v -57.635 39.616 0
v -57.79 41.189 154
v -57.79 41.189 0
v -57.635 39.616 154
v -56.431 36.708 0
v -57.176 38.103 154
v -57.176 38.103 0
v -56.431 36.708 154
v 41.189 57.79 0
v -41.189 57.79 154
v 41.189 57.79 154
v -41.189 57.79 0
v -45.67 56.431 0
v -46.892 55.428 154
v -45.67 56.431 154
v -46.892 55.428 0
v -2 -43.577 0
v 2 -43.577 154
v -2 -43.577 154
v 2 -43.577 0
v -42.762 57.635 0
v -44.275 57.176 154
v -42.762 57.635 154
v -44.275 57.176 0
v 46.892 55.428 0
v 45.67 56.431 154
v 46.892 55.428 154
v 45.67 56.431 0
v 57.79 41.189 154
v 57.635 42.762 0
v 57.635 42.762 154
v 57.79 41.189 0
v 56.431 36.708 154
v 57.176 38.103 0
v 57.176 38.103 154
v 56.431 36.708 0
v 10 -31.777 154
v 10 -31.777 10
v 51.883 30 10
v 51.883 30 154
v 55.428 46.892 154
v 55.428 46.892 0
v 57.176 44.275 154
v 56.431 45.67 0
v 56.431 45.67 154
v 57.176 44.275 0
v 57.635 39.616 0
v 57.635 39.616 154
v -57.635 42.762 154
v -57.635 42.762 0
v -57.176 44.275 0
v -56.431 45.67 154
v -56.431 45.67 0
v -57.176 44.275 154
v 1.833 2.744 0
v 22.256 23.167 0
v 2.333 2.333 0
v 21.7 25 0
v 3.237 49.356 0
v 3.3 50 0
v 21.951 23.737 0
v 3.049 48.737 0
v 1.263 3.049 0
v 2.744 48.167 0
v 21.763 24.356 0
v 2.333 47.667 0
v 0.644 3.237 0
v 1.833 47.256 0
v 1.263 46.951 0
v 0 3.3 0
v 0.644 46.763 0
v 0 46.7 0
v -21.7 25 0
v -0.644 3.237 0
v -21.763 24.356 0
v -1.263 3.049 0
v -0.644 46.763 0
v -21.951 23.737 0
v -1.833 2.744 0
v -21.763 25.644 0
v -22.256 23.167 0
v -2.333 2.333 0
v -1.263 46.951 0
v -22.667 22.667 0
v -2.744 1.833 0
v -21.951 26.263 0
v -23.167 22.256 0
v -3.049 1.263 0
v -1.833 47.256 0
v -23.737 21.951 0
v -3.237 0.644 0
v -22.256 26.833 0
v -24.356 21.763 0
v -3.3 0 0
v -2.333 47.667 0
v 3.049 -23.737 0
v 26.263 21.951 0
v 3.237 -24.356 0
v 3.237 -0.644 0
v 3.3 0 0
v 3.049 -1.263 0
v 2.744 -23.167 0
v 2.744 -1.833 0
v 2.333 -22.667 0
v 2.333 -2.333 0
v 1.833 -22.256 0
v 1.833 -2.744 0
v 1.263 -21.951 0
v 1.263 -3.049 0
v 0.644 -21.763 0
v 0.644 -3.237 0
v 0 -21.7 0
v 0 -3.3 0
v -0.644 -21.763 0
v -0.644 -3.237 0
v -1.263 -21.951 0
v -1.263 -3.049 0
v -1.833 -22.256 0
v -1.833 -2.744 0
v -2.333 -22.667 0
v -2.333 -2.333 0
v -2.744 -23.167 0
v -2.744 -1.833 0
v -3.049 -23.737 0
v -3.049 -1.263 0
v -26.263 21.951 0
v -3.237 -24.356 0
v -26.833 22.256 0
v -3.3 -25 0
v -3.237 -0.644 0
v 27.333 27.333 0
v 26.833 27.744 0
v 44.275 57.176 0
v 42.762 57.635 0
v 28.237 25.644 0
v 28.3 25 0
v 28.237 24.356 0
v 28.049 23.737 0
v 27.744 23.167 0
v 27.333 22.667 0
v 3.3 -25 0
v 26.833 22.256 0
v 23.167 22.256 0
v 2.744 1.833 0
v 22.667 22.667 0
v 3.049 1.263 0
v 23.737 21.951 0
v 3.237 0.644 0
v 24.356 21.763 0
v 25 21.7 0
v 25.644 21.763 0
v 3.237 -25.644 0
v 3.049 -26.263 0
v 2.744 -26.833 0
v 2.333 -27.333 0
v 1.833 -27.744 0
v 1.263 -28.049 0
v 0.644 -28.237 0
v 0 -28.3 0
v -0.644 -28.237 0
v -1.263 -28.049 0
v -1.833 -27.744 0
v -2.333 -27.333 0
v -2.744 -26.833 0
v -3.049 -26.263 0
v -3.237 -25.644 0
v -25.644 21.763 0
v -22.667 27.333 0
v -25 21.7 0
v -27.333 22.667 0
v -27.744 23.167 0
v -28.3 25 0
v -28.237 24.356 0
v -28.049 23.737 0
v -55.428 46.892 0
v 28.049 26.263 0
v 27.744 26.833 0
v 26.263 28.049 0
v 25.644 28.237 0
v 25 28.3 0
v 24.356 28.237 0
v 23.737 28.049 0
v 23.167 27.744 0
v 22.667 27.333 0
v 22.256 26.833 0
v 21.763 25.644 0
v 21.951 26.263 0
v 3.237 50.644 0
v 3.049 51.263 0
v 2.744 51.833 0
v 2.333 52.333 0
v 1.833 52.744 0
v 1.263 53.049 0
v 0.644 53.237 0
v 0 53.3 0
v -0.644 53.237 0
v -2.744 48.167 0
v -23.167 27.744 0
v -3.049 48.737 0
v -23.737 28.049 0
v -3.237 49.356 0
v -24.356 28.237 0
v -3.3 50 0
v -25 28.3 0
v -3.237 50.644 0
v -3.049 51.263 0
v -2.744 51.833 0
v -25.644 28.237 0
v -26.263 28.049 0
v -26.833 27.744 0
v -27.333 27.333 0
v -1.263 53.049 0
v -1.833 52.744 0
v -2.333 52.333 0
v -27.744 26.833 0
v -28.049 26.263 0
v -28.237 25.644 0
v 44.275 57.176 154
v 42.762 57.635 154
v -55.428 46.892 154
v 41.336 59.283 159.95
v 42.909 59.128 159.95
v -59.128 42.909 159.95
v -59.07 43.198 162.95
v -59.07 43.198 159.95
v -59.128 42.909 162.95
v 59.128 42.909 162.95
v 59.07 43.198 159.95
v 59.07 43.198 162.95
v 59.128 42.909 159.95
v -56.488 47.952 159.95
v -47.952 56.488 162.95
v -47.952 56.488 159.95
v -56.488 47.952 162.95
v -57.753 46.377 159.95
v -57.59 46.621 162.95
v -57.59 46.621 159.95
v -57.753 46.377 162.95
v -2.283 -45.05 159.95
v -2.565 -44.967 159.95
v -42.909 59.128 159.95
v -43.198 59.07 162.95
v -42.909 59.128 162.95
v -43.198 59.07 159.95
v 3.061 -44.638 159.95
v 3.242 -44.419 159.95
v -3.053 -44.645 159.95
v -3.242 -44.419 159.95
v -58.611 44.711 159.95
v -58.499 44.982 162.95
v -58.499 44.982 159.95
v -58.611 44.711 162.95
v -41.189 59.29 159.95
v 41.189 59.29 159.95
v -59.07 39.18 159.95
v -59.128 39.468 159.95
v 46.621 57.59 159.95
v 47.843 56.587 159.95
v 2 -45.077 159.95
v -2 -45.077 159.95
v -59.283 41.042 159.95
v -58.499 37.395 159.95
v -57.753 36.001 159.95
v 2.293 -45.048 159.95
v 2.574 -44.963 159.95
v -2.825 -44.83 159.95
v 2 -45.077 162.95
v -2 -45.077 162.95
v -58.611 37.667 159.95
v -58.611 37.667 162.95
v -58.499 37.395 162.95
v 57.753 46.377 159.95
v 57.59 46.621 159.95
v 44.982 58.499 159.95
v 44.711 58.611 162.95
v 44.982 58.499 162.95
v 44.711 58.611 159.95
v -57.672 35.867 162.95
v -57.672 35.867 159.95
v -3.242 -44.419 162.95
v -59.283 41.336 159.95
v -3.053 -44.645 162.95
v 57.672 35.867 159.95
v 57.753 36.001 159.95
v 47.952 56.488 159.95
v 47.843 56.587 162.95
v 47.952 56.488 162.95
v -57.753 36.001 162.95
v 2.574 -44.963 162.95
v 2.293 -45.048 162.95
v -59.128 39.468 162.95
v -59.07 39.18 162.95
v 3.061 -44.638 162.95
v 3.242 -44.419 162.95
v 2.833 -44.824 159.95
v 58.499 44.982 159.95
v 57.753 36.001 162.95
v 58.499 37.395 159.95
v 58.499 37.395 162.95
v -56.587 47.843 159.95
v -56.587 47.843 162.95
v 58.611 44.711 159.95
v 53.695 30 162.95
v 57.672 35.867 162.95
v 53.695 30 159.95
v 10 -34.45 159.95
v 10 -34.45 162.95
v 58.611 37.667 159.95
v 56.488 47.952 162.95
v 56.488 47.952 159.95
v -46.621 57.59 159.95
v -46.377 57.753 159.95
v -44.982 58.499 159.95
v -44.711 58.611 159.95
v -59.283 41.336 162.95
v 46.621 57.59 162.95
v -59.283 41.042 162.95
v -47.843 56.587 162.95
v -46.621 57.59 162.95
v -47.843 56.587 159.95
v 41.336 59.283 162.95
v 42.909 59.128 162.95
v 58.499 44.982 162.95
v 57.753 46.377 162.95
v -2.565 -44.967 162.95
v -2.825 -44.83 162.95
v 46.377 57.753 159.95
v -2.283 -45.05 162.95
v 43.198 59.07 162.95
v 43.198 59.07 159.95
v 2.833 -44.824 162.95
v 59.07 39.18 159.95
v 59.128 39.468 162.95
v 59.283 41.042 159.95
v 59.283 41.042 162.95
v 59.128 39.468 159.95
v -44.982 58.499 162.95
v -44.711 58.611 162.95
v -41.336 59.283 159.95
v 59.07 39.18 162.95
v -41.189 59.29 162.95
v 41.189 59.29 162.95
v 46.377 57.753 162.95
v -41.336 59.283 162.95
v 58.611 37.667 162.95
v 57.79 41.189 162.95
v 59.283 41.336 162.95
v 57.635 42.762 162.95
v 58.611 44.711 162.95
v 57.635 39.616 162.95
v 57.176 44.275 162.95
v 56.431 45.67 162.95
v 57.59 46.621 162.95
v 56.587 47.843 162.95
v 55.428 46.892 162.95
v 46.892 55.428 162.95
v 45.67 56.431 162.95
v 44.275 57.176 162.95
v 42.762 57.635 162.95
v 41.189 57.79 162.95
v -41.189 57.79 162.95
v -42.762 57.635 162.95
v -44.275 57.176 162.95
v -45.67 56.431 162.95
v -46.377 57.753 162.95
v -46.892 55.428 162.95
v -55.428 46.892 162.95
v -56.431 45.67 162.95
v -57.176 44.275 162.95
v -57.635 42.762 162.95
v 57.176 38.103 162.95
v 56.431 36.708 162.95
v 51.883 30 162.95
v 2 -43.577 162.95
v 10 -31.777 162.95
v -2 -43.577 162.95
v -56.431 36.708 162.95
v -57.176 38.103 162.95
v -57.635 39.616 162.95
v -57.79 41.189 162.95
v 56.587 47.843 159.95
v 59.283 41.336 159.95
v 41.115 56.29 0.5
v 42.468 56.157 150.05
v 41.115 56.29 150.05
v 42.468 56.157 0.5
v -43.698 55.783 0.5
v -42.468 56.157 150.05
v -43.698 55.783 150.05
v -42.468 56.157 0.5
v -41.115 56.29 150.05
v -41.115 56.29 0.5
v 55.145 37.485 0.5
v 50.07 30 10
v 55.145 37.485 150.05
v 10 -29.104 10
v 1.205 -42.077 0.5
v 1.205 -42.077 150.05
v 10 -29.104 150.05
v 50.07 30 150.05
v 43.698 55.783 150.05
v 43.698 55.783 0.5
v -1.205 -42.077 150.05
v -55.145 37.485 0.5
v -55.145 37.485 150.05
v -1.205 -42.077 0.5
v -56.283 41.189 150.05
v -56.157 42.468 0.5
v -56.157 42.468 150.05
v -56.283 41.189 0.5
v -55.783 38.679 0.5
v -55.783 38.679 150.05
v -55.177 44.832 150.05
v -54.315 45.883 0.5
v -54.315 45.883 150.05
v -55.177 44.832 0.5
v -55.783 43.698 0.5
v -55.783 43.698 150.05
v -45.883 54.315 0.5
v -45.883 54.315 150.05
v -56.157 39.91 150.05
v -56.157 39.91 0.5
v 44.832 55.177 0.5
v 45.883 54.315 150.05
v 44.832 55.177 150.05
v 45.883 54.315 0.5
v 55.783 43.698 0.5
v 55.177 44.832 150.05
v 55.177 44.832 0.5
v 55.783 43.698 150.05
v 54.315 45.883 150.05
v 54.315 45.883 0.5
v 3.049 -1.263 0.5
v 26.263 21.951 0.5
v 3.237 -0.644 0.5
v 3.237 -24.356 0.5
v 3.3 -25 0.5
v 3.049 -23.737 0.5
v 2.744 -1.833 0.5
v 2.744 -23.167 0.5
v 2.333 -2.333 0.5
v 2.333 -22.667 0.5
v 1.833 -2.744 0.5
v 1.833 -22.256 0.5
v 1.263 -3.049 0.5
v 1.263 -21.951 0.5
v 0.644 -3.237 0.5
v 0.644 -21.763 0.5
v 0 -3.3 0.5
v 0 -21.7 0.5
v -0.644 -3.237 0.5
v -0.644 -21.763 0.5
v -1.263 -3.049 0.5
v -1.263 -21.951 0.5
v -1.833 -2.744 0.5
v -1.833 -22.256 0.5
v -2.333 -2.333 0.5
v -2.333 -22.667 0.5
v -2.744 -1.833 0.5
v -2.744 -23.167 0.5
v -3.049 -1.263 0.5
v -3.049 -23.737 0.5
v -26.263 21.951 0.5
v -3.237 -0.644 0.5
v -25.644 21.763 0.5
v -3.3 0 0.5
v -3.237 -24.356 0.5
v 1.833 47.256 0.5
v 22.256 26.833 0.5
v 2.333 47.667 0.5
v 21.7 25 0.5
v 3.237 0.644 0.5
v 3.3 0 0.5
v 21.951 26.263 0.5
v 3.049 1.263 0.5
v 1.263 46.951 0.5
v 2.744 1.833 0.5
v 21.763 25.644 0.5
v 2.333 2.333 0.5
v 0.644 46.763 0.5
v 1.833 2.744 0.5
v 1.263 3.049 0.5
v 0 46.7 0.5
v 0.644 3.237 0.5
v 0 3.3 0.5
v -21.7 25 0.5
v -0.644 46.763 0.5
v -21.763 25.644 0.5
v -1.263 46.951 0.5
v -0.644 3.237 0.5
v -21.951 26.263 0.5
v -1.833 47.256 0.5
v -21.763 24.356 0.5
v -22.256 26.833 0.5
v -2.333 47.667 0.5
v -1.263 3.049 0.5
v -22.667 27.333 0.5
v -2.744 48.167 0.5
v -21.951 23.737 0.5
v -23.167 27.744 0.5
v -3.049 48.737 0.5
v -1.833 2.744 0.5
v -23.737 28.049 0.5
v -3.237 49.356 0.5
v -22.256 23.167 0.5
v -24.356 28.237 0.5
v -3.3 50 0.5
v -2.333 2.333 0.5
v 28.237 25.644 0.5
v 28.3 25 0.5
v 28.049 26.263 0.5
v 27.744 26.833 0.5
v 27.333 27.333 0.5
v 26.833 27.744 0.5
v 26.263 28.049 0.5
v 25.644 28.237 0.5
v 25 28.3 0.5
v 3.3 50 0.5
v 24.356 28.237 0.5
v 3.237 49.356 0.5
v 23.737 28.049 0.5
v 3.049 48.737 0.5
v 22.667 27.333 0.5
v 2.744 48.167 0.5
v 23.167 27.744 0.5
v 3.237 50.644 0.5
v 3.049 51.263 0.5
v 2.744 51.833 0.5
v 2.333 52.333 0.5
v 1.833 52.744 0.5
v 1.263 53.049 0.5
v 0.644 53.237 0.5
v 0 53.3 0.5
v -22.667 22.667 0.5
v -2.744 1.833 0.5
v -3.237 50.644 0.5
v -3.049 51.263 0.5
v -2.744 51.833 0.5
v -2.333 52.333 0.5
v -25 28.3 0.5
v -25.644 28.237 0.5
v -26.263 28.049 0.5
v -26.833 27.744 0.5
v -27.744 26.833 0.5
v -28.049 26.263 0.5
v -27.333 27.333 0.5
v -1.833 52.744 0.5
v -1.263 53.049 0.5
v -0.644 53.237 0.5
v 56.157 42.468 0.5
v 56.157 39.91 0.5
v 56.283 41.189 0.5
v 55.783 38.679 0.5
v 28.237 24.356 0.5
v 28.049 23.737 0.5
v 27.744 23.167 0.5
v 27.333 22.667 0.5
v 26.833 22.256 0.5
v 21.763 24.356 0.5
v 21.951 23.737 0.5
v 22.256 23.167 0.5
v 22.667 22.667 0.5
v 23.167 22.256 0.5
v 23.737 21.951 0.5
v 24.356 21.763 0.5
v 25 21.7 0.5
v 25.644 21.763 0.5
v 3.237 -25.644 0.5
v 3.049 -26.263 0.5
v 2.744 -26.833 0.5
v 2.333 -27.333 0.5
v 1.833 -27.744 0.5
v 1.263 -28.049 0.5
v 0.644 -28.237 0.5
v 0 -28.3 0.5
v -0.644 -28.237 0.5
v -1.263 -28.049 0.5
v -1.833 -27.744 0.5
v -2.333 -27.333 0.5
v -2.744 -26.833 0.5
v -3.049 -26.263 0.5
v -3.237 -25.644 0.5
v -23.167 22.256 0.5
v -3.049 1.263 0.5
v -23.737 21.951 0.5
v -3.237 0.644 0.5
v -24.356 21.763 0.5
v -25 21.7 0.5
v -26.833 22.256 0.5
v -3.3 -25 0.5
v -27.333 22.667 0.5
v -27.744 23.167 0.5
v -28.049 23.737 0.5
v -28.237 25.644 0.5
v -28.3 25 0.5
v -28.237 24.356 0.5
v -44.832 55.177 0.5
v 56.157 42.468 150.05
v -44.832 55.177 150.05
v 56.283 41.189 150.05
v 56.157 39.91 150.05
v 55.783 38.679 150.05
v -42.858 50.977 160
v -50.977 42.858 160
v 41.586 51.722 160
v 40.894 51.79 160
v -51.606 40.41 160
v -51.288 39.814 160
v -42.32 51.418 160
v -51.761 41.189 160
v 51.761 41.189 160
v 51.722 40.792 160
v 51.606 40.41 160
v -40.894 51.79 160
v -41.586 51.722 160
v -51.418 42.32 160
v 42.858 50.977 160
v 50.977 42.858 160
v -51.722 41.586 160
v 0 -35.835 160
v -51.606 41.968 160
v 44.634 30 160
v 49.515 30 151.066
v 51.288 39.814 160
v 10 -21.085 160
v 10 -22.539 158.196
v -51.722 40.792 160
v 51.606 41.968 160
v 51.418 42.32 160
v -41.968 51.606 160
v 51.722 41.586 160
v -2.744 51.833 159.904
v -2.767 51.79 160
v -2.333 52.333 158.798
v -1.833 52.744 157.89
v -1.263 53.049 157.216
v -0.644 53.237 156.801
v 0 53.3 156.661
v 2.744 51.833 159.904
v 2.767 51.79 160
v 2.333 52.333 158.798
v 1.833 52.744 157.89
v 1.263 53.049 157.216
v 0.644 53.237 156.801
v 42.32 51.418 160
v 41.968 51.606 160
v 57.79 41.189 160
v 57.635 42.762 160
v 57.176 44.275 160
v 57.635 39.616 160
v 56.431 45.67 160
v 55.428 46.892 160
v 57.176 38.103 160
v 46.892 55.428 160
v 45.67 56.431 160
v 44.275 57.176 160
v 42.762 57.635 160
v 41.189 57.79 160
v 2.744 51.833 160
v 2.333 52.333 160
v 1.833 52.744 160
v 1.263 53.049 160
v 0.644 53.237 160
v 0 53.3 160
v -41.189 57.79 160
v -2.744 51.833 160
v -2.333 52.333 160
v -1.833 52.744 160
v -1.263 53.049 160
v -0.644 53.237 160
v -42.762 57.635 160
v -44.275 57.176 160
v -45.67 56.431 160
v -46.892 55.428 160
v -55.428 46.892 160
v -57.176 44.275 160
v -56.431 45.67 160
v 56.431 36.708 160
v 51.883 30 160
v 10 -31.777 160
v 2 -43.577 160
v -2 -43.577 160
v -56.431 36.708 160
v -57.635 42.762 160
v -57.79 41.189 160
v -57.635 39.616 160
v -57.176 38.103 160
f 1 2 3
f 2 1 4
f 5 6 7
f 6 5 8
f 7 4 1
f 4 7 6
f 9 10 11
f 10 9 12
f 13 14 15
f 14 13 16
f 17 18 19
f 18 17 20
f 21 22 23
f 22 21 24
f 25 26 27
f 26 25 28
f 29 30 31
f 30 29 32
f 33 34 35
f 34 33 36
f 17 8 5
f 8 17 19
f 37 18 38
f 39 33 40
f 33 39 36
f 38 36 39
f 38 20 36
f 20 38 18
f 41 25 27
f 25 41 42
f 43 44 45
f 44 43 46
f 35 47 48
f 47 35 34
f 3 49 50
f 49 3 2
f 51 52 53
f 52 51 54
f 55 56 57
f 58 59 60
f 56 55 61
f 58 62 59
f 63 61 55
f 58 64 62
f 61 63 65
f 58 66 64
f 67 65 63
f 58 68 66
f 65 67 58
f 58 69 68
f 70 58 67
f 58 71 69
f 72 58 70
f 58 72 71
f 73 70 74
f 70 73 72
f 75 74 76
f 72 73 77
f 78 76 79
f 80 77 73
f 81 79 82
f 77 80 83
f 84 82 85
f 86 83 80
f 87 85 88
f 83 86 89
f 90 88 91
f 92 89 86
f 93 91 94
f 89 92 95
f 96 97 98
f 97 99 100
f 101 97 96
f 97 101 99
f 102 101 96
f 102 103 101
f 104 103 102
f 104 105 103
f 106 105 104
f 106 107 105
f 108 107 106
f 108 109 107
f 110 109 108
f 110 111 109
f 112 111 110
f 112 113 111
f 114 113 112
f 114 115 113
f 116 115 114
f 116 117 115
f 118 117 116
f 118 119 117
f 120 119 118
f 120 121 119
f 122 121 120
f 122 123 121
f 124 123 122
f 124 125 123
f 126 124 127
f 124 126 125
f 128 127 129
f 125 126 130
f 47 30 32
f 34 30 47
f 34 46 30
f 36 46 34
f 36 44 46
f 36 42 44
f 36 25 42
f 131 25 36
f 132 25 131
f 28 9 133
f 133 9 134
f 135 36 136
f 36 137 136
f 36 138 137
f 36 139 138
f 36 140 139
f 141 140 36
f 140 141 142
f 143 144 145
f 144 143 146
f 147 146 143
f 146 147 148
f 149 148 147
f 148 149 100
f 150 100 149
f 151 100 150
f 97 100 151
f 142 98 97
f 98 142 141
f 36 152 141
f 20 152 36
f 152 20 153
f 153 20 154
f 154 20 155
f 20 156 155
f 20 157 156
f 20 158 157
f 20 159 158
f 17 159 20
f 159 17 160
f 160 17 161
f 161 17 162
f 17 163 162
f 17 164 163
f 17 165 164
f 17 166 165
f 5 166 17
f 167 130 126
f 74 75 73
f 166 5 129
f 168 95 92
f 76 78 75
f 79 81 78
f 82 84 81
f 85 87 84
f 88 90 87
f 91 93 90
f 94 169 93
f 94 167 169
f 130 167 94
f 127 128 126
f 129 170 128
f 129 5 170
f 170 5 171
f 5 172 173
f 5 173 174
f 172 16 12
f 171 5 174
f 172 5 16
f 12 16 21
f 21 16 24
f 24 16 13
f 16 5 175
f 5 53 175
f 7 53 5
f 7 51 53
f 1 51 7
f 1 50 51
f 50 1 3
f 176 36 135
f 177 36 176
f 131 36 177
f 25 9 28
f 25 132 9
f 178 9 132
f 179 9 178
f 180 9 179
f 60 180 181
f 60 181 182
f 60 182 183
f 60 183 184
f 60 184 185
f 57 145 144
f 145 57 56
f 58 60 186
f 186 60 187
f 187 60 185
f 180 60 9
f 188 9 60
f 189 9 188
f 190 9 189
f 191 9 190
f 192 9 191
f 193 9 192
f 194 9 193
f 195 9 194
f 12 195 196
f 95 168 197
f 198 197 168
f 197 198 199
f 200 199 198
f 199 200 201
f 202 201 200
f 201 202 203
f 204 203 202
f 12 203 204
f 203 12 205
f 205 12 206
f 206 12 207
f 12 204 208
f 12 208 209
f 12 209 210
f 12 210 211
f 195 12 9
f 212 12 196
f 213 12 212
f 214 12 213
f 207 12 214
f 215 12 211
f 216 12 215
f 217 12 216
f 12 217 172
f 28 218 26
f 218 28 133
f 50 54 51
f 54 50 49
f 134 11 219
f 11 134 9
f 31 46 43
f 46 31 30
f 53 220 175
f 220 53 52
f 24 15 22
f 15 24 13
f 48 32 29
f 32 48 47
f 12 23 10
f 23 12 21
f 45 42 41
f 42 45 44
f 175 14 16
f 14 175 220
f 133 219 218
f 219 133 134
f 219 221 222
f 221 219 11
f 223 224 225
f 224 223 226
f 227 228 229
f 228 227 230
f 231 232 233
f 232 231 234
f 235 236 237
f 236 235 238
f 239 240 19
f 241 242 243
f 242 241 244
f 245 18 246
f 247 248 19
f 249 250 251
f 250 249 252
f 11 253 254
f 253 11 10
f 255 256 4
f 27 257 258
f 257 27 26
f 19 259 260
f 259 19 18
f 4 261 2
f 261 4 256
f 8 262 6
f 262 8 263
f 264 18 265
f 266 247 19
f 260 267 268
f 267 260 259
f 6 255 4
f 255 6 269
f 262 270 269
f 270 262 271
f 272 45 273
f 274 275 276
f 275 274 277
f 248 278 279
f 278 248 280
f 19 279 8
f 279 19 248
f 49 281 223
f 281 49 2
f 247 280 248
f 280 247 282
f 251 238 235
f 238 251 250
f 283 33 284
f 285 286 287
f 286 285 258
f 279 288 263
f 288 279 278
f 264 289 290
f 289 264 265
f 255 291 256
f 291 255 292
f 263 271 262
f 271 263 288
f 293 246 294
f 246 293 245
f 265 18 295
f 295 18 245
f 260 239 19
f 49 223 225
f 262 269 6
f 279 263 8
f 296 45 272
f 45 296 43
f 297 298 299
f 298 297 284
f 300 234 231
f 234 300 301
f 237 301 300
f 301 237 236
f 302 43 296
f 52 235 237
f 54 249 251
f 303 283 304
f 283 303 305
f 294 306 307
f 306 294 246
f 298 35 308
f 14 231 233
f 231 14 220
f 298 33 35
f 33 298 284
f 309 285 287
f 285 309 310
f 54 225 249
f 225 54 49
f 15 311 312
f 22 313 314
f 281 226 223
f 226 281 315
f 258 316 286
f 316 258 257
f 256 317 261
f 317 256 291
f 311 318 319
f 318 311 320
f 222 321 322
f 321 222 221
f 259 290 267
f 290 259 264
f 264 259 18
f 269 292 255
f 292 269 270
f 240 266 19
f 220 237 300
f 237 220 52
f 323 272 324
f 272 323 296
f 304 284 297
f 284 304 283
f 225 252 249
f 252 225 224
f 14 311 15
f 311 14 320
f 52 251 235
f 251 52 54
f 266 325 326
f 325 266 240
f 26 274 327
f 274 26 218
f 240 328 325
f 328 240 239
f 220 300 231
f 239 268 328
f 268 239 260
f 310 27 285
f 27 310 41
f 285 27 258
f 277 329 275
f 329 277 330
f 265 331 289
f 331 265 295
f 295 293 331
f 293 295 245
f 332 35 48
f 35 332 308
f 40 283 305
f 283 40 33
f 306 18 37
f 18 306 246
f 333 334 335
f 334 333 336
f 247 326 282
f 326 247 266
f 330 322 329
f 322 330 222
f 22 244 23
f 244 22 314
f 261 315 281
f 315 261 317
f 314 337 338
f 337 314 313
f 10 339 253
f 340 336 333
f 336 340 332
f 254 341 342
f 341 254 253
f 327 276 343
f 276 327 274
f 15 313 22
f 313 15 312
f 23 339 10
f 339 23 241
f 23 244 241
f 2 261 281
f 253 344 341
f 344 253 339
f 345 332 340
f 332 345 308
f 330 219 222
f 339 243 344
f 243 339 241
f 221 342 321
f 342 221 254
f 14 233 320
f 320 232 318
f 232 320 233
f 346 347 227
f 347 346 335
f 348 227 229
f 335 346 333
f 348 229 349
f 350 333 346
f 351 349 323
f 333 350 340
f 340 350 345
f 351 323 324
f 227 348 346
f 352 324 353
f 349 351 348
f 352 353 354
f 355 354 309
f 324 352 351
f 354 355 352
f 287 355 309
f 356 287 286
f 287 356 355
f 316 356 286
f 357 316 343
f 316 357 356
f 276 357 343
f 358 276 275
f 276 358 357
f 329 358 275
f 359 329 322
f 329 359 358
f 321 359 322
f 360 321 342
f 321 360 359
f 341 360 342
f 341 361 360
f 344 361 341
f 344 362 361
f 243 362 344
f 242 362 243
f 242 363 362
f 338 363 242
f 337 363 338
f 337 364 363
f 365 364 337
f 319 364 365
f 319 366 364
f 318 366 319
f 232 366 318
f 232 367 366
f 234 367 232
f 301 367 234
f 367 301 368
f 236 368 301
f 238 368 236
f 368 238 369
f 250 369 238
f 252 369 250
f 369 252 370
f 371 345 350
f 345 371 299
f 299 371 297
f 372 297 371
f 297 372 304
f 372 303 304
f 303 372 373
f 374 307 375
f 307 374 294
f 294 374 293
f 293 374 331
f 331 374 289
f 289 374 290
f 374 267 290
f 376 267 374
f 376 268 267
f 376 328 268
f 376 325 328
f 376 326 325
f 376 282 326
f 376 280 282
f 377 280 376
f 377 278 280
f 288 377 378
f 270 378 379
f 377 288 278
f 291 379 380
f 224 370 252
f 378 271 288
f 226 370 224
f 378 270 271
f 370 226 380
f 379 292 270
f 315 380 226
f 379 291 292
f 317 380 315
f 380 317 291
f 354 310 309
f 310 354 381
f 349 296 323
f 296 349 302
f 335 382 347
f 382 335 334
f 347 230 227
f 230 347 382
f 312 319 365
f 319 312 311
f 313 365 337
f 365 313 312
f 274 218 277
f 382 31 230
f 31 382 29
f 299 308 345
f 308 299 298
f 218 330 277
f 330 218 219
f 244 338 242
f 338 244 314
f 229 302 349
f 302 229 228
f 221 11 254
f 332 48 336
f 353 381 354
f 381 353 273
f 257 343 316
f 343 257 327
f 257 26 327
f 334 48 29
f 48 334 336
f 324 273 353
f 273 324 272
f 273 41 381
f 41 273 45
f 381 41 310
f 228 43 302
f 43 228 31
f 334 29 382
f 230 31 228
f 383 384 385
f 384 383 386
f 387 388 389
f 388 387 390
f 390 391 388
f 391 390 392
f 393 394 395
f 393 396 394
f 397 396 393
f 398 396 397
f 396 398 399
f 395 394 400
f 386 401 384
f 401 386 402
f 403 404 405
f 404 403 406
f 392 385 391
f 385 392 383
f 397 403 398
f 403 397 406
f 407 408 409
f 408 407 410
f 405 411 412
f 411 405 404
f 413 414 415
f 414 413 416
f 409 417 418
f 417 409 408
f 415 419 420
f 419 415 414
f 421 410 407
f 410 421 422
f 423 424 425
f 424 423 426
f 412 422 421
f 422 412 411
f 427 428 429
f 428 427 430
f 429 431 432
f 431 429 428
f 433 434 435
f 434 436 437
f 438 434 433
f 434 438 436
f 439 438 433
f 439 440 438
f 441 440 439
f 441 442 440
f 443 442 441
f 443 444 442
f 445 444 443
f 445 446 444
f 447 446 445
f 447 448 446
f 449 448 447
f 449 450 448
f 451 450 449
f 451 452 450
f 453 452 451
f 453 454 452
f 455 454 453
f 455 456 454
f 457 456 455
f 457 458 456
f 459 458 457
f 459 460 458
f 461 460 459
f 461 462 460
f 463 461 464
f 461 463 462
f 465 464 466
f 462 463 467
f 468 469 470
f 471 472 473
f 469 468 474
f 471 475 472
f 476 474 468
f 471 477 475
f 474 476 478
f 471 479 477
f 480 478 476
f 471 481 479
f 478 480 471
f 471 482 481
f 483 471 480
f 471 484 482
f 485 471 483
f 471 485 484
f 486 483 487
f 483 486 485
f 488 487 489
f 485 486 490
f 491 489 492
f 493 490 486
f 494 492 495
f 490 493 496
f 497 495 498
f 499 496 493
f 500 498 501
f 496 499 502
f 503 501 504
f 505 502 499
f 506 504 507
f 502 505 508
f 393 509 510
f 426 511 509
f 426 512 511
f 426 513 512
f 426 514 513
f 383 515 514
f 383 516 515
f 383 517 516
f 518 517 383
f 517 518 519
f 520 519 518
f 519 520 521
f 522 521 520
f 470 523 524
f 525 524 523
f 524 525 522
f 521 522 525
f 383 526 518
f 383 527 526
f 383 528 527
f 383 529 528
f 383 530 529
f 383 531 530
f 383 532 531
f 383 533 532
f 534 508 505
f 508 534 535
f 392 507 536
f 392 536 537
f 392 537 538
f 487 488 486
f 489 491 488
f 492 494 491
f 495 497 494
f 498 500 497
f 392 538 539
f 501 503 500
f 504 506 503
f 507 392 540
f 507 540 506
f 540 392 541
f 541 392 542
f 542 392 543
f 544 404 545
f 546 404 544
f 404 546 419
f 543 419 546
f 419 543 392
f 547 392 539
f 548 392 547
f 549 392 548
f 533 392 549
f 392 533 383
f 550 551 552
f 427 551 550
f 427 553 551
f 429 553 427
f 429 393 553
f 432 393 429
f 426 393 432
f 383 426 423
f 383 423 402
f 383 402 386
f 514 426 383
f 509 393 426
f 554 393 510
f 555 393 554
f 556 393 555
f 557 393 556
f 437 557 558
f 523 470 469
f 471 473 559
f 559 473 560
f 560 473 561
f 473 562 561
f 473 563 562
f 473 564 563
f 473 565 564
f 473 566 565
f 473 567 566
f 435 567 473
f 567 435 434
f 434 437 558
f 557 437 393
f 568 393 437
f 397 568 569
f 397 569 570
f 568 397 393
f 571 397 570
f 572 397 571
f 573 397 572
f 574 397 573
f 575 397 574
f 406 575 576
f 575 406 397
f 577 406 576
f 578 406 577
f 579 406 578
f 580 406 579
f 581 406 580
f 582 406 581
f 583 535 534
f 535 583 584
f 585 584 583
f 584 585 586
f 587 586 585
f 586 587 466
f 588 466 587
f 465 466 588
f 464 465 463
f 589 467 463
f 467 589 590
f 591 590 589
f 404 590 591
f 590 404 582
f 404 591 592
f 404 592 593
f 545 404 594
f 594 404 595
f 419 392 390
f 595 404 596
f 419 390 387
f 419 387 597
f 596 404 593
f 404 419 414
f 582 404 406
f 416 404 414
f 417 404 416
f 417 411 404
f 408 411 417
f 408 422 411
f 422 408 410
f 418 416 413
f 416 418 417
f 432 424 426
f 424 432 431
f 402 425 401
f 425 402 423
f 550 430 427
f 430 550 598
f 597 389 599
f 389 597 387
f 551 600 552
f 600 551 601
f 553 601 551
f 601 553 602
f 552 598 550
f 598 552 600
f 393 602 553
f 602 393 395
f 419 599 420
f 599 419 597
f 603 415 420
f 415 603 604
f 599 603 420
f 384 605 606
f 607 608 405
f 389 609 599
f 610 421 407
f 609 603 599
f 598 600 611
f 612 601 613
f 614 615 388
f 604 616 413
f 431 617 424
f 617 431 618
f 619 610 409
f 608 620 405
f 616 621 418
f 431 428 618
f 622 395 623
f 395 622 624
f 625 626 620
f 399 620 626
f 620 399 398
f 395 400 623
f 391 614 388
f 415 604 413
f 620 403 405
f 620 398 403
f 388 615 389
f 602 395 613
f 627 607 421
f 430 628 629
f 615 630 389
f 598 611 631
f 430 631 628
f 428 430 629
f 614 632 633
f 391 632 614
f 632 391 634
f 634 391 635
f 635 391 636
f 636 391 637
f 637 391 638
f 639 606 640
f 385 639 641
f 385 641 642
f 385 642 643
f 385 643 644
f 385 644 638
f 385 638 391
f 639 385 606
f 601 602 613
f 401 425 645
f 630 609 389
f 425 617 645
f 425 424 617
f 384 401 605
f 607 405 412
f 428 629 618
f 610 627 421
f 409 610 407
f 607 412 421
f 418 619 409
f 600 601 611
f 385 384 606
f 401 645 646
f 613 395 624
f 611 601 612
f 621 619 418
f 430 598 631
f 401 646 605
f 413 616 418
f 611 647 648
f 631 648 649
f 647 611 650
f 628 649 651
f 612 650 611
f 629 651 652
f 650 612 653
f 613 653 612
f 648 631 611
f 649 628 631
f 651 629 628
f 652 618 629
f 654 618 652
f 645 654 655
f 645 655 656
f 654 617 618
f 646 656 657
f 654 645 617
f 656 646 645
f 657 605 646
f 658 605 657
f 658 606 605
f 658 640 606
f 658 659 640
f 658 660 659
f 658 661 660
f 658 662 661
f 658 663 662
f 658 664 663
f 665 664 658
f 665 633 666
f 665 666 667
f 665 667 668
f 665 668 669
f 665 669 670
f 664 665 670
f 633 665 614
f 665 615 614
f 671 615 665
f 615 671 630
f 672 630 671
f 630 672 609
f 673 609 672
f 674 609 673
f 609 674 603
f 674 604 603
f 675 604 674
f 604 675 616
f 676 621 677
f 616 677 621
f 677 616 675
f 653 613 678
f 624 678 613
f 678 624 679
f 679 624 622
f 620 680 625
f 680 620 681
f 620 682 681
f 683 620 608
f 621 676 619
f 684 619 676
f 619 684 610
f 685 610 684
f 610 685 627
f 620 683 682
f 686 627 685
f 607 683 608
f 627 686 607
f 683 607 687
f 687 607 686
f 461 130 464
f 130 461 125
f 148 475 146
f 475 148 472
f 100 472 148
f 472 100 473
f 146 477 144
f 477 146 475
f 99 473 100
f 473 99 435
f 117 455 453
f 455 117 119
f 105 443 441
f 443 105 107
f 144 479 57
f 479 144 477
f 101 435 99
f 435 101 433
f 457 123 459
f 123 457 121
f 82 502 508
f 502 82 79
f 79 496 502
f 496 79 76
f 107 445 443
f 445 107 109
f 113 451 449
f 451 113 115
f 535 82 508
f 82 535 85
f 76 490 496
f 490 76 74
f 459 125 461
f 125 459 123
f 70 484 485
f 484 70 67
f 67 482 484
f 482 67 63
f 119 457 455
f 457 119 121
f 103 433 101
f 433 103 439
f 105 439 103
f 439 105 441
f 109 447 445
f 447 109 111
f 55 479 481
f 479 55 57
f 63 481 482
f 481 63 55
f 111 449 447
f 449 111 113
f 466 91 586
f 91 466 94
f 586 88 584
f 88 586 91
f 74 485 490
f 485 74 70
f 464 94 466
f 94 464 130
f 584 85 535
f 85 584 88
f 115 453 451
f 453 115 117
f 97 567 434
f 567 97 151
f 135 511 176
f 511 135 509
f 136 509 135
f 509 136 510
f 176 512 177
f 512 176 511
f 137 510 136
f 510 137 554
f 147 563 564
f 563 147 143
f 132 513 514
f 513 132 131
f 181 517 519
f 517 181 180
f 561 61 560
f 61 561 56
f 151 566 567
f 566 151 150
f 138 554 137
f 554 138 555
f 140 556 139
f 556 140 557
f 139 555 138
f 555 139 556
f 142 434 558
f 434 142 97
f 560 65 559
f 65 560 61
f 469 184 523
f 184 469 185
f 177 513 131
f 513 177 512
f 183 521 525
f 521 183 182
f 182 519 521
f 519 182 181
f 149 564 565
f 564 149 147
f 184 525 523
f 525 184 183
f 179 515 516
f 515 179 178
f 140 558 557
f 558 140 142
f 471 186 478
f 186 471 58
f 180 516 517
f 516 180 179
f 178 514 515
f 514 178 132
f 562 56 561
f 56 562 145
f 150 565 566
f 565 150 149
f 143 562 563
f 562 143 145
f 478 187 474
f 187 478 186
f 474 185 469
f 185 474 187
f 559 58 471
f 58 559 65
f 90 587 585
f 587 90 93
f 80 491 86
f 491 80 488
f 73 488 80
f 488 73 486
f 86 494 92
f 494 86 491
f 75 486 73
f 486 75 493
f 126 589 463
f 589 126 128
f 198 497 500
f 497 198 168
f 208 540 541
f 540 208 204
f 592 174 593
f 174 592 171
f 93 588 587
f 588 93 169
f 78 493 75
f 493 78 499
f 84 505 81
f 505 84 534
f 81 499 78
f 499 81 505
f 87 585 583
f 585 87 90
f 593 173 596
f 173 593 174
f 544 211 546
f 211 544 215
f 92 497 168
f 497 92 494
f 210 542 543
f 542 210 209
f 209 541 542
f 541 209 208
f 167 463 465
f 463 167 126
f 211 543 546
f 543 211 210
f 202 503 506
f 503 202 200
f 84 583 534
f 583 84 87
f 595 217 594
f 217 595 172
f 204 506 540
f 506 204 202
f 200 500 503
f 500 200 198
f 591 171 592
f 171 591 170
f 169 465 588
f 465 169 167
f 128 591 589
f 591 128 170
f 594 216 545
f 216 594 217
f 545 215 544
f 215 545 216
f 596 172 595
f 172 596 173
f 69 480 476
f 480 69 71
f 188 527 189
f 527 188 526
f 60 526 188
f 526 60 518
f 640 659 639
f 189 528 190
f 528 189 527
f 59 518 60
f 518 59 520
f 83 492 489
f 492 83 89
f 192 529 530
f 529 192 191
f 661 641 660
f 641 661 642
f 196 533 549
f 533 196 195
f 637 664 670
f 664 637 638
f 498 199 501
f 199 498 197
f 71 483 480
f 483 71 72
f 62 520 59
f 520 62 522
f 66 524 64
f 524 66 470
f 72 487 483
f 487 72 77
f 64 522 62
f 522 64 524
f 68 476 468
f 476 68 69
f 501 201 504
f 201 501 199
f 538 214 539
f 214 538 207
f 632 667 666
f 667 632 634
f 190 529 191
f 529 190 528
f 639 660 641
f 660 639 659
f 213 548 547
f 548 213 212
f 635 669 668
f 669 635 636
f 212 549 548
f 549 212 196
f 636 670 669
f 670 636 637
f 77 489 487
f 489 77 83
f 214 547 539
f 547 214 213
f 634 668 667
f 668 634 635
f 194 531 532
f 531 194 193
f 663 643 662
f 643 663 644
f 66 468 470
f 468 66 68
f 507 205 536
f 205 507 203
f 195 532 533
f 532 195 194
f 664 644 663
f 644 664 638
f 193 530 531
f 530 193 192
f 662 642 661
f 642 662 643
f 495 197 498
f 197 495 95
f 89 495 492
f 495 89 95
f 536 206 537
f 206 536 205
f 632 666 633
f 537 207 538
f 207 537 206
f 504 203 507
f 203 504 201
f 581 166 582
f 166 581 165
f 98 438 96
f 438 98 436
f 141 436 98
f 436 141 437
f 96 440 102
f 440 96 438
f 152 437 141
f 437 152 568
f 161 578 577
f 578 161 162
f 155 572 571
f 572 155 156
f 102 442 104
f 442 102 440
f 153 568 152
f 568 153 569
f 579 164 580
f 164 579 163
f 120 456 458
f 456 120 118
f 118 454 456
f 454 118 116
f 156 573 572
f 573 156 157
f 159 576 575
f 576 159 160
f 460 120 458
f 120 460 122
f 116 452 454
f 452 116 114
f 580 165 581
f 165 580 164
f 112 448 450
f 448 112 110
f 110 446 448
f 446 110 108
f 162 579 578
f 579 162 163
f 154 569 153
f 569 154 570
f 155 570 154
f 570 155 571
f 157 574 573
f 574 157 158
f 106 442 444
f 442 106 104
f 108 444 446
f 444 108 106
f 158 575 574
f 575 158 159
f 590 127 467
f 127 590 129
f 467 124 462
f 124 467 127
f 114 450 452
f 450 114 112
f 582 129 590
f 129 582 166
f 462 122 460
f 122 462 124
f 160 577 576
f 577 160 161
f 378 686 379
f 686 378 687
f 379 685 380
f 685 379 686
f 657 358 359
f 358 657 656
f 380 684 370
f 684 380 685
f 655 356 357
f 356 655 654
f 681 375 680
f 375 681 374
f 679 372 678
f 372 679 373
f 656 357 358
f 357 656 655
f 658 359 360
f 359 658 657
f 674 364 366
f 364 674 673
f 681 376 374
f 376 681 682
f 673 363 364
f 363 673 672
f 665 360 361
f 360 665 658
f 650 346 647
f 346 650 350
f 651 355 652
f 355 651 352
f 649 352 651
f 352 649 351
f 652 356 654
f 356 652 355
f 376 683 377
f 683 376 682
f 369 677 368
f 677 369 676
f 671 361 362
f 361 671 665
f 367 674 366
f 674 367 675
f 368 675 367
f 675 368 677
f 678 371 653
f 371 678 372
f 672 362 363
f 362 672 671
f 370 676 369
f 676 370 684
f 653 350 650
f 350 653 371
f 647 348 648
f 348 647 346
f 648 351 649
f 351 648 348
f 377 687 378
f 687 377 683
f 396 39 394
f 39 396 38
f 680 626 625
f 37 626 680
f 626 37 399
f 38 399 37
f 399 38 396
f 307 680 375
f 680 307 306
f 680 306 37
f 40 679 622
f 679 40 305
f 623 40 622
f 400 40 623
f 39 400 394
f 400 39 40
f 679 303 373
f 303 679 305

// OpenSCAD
// file: microscope_parameters.scad
/******************************************************************
*                                                                 *
* OpenFlexure Microscope: Microscope Parameters                   *
*                                                                 *
* This is the top-level configuration file for the OpenFlexure    *
* microscope, an open microscope and 3-axis translation stage.    *
* It gets really good precision over a ~10mm range, by using      *
* plastic flexure mechanisms.                                     *
*                                                                 *
* Generally I've tried to put parts (or collections of closely    *
* related parts) in their own files.  However, all the parts      *
* depend on the geometry of the microscope - so these parameters  *
* are gathered together here.  In general, the ones you might     *
* to change are towards the top!  Lower-down ones are defined in  *
* terms of higher-up ones - confusion might arise if you redefine *
* these later...                                                  *
*                                                                 *
* (c) Richard Bowman, January 2016                                *
* Released under the CERN Open Hardware License                   *
*                                                                 *
* http://www.github.com/rwb27/openflexure_microscope              *
* http://www.docubricks.com/projects/openflexure-microscope       *
* http://www.waterscope.org                                       *
*                                                                 *
******************************************************************/

d = 0.05;
$fn=32;

// These are the most useful parameters to change!
big_stage = true;
motor_lugs = true;
version_numstring = "5.17.1";
camera = "picamera_2"; //see cameras/camera.scad for valid values
optics = big_stage?"rms_f40d16":"pilens"; //see optics.scad for valid values

// This sets the basic geometry of the microscope
sample_z = big_stage?65:40; // height of the top of the stage
leg_r = big_stage?30:25; // radius of innermost part of legs (stage size)
hole_r = big_stage?15:10; // size of hole in the stage
xy_lever_ratio = big_stage?4.0/7.0:1.0; // mechanical advantage of actuator over stage - can be used to trade speed and precision
z_lever_ratio = big_stage?2.4:2.6; // as above, for Z axis (must be >1)
// The variables below affect the position of the objective mount
z_strut_l = big_stage?20:15; //length of struts supporting Z carriage
objective_clip_y = big_stage?12:6; // y position of clip for optics
objective_clip_w = 10; // width of the dovetail clip for the optics
foot_height = 15; //height of the feet (distance from bottom of body to table)

// These variables set the dimensions of flexures
// You might want to tweak them if your material (or printer)
// is different from the ones I've tested, though ABS/PLA extrusion
// is generally fine with my parameters
stage_flex_w = 4; // width of XY axis flexures
zflex_l = 1.5;    // length of (all) flexible bits
zflex_t = 0.75;   // thickness of (all) flexible bits
zflex = [stage_flex_w, zflex_l, zflex_t]; // the above in new-style format
flex_a = 0.15;    // sine of the angle through which flexures can be bent

// Compile a sensible version string
version_string = str("v",version_numstring, big_stage?"-LS":"-SS", sample_z, motor_lugs?"-M":"");
echo(str("Compiling OpenFlexure Microscope ",version_string));

stage_t=5; //thickness of the XY stage (at thickest point, most is 1mm less)
flex_z1 = 0;      // z position of lower flexures for XY axis
flex_z2 = sample_z-stage_t; //height of upper XY flexures
z_strut_t = 6;  // (z) thickness of struts for Z axis
z_flex_w = 4;   // width of struts for Z axis
leg = [4,stage_flex_w,flex_z2+zflex_t]; // size of vertical legs
leg_middle_w = 12; // width of the middle part of each leg
actuator_h = 25; //height of the actuator columns
dz = 0.5; //small increment in Z (~ 2 layers)

leg_outer_w = leg_middle_w + 2*zflex_l + 2*leg[0]; // overall width of parallelogram legs that support the stagef
actuator = [3*1.2+2*2,(flex_z2 - flex_z1)*xy_lever_ratio,6]; // dimensions of the core part of the actuating levers for X and Y - NB should match the column_base_r in compact_nut_seat.scad
actuating_nut_r = (flex_z2 - flex_z1)*xy_lever_ratio; // distance from leg_r to the actuating nut/screw for the XY axes
xy_actuator_travel = actuating_nut_r*0.15; // distance moved by XY axis actuators
z_flexure_x = (leg_r-zflex_l-max(5,leg[2]*0.1))*sqrt(2); // x position of the outside of the Z-axis static anchors (either side of the XY stage, on the X axis)
z_flexure_spacing = min(flex_z2-actuator[2]-z_strut_l*0.22-2, 30); // distance between the two sets of flexures on the Z axis
z_carriage = [(z_flexure_x-zflex_l*2-z_strut_l)+d,4,z_flexure_spacing+zflex_t]; //size of the moving block for the Z carriage
z_nut_y = (z_strut_l+zflex_l)*z_lever_ratio+zflex_l/2; // position of Z actuator
z_actuator_travel = z_nut_y*0.15; // distance moved by the Z actuator
z_carriage_y = z_strut_l+2*zflex_l; // y position of moving pivot on Z axis
z_link_w = 4; // width of linking bar between top Z-axis flexure struts
bridge_dz = 10; // spacing between thin links on legs
base_t=1; // thickness of the flat base of the structure
wall_h=15; // height of the stiffening vertical(ish) walls
wall_t=2; //thickness of the stiffening walls
zawall_h = z_flexure_spacing - 5; //height of wall near Z anchor
zbwall_h = z_actuator_travel+z_strut_t+1+2; //height of bridge over Z lever
illumination_clip_y = (-(leg_r-zflex_l-wall_t/2+leg_outer_w/2)/sqrt(2)
                       -wall_t/2-1); //position of clip for
                      // illumination/back foot.  This is set to
                      // coincide with the wall between the back
                      // two legs.
illumination_arm_screws = [[0,illumination_clip_y+3,0],
                           [-z_flexure_x+3,-3,0],
                           [z_flexure_x-3,-3,0]];
                      // positions of screws that mount the adjustable version of the 
                      // illumination arm
condenser_clip_y = -8; //position of dovetail for condenser assembly
base_mounting_holes = [[-20,z_nut_y-4,0],[20,z_nut_y-4,0],[-z_flexure_x-4,-8,0],[z_flexure_x+4,-8,0]]; // holes to screw the microscope to a baseplate
// main file
// A quick and dirty stand for the microscope to let me play with
// longer optics modules

use <utilities.scad>;
include <microscope_parameters.scad>;
use <compact_nut_seat.scad>;

h = 160;
t = 1.5;

module footprint(){
    hull(){
        translate([-2, illumination_clip_y-14]) square(4);
        reflect([1,0]) rotate(45) translate([0, leg_r + actuating_nut_r]) 
            projection(cut=true) translate([0,0,-1]) screw_seat_shell();
    }
}

difference(){
    sequential_hull(){
        translate([0,0,0]) linear_extrude(d) offset(0) footprint();
        translate([0,0,h-6]) linear_extrude(d) offset(0) footprint();
        translate([0,0,h-d]) linear_extrude(2*t) offset(t) footprint();
    }
    
    // hollow out the inside
    sequential_hull(){
        translate([0,0,0.5]) linear_extrude(d) offset(-t) footprint();
        translate([0,0,h-10]) linear_extrude(d) offset(-t) footprint();
        translate([0,0,h-d]) linear_extrude(d) offset(-6) footprint();
    }
    
    // indent the top
    translate([0,0,h]) linear_extrude(999) footprint();
    
    // side access
    translate([10,-999+30, 10]) cube(999);
    
    // breadboard mounting
    for(p=[[0,0,0], [25,25,0], [-25,25,0], [0,50,0], [0,-25,0]]) translate(p) cylinder(d=6.6,h=999,center=true);
}
